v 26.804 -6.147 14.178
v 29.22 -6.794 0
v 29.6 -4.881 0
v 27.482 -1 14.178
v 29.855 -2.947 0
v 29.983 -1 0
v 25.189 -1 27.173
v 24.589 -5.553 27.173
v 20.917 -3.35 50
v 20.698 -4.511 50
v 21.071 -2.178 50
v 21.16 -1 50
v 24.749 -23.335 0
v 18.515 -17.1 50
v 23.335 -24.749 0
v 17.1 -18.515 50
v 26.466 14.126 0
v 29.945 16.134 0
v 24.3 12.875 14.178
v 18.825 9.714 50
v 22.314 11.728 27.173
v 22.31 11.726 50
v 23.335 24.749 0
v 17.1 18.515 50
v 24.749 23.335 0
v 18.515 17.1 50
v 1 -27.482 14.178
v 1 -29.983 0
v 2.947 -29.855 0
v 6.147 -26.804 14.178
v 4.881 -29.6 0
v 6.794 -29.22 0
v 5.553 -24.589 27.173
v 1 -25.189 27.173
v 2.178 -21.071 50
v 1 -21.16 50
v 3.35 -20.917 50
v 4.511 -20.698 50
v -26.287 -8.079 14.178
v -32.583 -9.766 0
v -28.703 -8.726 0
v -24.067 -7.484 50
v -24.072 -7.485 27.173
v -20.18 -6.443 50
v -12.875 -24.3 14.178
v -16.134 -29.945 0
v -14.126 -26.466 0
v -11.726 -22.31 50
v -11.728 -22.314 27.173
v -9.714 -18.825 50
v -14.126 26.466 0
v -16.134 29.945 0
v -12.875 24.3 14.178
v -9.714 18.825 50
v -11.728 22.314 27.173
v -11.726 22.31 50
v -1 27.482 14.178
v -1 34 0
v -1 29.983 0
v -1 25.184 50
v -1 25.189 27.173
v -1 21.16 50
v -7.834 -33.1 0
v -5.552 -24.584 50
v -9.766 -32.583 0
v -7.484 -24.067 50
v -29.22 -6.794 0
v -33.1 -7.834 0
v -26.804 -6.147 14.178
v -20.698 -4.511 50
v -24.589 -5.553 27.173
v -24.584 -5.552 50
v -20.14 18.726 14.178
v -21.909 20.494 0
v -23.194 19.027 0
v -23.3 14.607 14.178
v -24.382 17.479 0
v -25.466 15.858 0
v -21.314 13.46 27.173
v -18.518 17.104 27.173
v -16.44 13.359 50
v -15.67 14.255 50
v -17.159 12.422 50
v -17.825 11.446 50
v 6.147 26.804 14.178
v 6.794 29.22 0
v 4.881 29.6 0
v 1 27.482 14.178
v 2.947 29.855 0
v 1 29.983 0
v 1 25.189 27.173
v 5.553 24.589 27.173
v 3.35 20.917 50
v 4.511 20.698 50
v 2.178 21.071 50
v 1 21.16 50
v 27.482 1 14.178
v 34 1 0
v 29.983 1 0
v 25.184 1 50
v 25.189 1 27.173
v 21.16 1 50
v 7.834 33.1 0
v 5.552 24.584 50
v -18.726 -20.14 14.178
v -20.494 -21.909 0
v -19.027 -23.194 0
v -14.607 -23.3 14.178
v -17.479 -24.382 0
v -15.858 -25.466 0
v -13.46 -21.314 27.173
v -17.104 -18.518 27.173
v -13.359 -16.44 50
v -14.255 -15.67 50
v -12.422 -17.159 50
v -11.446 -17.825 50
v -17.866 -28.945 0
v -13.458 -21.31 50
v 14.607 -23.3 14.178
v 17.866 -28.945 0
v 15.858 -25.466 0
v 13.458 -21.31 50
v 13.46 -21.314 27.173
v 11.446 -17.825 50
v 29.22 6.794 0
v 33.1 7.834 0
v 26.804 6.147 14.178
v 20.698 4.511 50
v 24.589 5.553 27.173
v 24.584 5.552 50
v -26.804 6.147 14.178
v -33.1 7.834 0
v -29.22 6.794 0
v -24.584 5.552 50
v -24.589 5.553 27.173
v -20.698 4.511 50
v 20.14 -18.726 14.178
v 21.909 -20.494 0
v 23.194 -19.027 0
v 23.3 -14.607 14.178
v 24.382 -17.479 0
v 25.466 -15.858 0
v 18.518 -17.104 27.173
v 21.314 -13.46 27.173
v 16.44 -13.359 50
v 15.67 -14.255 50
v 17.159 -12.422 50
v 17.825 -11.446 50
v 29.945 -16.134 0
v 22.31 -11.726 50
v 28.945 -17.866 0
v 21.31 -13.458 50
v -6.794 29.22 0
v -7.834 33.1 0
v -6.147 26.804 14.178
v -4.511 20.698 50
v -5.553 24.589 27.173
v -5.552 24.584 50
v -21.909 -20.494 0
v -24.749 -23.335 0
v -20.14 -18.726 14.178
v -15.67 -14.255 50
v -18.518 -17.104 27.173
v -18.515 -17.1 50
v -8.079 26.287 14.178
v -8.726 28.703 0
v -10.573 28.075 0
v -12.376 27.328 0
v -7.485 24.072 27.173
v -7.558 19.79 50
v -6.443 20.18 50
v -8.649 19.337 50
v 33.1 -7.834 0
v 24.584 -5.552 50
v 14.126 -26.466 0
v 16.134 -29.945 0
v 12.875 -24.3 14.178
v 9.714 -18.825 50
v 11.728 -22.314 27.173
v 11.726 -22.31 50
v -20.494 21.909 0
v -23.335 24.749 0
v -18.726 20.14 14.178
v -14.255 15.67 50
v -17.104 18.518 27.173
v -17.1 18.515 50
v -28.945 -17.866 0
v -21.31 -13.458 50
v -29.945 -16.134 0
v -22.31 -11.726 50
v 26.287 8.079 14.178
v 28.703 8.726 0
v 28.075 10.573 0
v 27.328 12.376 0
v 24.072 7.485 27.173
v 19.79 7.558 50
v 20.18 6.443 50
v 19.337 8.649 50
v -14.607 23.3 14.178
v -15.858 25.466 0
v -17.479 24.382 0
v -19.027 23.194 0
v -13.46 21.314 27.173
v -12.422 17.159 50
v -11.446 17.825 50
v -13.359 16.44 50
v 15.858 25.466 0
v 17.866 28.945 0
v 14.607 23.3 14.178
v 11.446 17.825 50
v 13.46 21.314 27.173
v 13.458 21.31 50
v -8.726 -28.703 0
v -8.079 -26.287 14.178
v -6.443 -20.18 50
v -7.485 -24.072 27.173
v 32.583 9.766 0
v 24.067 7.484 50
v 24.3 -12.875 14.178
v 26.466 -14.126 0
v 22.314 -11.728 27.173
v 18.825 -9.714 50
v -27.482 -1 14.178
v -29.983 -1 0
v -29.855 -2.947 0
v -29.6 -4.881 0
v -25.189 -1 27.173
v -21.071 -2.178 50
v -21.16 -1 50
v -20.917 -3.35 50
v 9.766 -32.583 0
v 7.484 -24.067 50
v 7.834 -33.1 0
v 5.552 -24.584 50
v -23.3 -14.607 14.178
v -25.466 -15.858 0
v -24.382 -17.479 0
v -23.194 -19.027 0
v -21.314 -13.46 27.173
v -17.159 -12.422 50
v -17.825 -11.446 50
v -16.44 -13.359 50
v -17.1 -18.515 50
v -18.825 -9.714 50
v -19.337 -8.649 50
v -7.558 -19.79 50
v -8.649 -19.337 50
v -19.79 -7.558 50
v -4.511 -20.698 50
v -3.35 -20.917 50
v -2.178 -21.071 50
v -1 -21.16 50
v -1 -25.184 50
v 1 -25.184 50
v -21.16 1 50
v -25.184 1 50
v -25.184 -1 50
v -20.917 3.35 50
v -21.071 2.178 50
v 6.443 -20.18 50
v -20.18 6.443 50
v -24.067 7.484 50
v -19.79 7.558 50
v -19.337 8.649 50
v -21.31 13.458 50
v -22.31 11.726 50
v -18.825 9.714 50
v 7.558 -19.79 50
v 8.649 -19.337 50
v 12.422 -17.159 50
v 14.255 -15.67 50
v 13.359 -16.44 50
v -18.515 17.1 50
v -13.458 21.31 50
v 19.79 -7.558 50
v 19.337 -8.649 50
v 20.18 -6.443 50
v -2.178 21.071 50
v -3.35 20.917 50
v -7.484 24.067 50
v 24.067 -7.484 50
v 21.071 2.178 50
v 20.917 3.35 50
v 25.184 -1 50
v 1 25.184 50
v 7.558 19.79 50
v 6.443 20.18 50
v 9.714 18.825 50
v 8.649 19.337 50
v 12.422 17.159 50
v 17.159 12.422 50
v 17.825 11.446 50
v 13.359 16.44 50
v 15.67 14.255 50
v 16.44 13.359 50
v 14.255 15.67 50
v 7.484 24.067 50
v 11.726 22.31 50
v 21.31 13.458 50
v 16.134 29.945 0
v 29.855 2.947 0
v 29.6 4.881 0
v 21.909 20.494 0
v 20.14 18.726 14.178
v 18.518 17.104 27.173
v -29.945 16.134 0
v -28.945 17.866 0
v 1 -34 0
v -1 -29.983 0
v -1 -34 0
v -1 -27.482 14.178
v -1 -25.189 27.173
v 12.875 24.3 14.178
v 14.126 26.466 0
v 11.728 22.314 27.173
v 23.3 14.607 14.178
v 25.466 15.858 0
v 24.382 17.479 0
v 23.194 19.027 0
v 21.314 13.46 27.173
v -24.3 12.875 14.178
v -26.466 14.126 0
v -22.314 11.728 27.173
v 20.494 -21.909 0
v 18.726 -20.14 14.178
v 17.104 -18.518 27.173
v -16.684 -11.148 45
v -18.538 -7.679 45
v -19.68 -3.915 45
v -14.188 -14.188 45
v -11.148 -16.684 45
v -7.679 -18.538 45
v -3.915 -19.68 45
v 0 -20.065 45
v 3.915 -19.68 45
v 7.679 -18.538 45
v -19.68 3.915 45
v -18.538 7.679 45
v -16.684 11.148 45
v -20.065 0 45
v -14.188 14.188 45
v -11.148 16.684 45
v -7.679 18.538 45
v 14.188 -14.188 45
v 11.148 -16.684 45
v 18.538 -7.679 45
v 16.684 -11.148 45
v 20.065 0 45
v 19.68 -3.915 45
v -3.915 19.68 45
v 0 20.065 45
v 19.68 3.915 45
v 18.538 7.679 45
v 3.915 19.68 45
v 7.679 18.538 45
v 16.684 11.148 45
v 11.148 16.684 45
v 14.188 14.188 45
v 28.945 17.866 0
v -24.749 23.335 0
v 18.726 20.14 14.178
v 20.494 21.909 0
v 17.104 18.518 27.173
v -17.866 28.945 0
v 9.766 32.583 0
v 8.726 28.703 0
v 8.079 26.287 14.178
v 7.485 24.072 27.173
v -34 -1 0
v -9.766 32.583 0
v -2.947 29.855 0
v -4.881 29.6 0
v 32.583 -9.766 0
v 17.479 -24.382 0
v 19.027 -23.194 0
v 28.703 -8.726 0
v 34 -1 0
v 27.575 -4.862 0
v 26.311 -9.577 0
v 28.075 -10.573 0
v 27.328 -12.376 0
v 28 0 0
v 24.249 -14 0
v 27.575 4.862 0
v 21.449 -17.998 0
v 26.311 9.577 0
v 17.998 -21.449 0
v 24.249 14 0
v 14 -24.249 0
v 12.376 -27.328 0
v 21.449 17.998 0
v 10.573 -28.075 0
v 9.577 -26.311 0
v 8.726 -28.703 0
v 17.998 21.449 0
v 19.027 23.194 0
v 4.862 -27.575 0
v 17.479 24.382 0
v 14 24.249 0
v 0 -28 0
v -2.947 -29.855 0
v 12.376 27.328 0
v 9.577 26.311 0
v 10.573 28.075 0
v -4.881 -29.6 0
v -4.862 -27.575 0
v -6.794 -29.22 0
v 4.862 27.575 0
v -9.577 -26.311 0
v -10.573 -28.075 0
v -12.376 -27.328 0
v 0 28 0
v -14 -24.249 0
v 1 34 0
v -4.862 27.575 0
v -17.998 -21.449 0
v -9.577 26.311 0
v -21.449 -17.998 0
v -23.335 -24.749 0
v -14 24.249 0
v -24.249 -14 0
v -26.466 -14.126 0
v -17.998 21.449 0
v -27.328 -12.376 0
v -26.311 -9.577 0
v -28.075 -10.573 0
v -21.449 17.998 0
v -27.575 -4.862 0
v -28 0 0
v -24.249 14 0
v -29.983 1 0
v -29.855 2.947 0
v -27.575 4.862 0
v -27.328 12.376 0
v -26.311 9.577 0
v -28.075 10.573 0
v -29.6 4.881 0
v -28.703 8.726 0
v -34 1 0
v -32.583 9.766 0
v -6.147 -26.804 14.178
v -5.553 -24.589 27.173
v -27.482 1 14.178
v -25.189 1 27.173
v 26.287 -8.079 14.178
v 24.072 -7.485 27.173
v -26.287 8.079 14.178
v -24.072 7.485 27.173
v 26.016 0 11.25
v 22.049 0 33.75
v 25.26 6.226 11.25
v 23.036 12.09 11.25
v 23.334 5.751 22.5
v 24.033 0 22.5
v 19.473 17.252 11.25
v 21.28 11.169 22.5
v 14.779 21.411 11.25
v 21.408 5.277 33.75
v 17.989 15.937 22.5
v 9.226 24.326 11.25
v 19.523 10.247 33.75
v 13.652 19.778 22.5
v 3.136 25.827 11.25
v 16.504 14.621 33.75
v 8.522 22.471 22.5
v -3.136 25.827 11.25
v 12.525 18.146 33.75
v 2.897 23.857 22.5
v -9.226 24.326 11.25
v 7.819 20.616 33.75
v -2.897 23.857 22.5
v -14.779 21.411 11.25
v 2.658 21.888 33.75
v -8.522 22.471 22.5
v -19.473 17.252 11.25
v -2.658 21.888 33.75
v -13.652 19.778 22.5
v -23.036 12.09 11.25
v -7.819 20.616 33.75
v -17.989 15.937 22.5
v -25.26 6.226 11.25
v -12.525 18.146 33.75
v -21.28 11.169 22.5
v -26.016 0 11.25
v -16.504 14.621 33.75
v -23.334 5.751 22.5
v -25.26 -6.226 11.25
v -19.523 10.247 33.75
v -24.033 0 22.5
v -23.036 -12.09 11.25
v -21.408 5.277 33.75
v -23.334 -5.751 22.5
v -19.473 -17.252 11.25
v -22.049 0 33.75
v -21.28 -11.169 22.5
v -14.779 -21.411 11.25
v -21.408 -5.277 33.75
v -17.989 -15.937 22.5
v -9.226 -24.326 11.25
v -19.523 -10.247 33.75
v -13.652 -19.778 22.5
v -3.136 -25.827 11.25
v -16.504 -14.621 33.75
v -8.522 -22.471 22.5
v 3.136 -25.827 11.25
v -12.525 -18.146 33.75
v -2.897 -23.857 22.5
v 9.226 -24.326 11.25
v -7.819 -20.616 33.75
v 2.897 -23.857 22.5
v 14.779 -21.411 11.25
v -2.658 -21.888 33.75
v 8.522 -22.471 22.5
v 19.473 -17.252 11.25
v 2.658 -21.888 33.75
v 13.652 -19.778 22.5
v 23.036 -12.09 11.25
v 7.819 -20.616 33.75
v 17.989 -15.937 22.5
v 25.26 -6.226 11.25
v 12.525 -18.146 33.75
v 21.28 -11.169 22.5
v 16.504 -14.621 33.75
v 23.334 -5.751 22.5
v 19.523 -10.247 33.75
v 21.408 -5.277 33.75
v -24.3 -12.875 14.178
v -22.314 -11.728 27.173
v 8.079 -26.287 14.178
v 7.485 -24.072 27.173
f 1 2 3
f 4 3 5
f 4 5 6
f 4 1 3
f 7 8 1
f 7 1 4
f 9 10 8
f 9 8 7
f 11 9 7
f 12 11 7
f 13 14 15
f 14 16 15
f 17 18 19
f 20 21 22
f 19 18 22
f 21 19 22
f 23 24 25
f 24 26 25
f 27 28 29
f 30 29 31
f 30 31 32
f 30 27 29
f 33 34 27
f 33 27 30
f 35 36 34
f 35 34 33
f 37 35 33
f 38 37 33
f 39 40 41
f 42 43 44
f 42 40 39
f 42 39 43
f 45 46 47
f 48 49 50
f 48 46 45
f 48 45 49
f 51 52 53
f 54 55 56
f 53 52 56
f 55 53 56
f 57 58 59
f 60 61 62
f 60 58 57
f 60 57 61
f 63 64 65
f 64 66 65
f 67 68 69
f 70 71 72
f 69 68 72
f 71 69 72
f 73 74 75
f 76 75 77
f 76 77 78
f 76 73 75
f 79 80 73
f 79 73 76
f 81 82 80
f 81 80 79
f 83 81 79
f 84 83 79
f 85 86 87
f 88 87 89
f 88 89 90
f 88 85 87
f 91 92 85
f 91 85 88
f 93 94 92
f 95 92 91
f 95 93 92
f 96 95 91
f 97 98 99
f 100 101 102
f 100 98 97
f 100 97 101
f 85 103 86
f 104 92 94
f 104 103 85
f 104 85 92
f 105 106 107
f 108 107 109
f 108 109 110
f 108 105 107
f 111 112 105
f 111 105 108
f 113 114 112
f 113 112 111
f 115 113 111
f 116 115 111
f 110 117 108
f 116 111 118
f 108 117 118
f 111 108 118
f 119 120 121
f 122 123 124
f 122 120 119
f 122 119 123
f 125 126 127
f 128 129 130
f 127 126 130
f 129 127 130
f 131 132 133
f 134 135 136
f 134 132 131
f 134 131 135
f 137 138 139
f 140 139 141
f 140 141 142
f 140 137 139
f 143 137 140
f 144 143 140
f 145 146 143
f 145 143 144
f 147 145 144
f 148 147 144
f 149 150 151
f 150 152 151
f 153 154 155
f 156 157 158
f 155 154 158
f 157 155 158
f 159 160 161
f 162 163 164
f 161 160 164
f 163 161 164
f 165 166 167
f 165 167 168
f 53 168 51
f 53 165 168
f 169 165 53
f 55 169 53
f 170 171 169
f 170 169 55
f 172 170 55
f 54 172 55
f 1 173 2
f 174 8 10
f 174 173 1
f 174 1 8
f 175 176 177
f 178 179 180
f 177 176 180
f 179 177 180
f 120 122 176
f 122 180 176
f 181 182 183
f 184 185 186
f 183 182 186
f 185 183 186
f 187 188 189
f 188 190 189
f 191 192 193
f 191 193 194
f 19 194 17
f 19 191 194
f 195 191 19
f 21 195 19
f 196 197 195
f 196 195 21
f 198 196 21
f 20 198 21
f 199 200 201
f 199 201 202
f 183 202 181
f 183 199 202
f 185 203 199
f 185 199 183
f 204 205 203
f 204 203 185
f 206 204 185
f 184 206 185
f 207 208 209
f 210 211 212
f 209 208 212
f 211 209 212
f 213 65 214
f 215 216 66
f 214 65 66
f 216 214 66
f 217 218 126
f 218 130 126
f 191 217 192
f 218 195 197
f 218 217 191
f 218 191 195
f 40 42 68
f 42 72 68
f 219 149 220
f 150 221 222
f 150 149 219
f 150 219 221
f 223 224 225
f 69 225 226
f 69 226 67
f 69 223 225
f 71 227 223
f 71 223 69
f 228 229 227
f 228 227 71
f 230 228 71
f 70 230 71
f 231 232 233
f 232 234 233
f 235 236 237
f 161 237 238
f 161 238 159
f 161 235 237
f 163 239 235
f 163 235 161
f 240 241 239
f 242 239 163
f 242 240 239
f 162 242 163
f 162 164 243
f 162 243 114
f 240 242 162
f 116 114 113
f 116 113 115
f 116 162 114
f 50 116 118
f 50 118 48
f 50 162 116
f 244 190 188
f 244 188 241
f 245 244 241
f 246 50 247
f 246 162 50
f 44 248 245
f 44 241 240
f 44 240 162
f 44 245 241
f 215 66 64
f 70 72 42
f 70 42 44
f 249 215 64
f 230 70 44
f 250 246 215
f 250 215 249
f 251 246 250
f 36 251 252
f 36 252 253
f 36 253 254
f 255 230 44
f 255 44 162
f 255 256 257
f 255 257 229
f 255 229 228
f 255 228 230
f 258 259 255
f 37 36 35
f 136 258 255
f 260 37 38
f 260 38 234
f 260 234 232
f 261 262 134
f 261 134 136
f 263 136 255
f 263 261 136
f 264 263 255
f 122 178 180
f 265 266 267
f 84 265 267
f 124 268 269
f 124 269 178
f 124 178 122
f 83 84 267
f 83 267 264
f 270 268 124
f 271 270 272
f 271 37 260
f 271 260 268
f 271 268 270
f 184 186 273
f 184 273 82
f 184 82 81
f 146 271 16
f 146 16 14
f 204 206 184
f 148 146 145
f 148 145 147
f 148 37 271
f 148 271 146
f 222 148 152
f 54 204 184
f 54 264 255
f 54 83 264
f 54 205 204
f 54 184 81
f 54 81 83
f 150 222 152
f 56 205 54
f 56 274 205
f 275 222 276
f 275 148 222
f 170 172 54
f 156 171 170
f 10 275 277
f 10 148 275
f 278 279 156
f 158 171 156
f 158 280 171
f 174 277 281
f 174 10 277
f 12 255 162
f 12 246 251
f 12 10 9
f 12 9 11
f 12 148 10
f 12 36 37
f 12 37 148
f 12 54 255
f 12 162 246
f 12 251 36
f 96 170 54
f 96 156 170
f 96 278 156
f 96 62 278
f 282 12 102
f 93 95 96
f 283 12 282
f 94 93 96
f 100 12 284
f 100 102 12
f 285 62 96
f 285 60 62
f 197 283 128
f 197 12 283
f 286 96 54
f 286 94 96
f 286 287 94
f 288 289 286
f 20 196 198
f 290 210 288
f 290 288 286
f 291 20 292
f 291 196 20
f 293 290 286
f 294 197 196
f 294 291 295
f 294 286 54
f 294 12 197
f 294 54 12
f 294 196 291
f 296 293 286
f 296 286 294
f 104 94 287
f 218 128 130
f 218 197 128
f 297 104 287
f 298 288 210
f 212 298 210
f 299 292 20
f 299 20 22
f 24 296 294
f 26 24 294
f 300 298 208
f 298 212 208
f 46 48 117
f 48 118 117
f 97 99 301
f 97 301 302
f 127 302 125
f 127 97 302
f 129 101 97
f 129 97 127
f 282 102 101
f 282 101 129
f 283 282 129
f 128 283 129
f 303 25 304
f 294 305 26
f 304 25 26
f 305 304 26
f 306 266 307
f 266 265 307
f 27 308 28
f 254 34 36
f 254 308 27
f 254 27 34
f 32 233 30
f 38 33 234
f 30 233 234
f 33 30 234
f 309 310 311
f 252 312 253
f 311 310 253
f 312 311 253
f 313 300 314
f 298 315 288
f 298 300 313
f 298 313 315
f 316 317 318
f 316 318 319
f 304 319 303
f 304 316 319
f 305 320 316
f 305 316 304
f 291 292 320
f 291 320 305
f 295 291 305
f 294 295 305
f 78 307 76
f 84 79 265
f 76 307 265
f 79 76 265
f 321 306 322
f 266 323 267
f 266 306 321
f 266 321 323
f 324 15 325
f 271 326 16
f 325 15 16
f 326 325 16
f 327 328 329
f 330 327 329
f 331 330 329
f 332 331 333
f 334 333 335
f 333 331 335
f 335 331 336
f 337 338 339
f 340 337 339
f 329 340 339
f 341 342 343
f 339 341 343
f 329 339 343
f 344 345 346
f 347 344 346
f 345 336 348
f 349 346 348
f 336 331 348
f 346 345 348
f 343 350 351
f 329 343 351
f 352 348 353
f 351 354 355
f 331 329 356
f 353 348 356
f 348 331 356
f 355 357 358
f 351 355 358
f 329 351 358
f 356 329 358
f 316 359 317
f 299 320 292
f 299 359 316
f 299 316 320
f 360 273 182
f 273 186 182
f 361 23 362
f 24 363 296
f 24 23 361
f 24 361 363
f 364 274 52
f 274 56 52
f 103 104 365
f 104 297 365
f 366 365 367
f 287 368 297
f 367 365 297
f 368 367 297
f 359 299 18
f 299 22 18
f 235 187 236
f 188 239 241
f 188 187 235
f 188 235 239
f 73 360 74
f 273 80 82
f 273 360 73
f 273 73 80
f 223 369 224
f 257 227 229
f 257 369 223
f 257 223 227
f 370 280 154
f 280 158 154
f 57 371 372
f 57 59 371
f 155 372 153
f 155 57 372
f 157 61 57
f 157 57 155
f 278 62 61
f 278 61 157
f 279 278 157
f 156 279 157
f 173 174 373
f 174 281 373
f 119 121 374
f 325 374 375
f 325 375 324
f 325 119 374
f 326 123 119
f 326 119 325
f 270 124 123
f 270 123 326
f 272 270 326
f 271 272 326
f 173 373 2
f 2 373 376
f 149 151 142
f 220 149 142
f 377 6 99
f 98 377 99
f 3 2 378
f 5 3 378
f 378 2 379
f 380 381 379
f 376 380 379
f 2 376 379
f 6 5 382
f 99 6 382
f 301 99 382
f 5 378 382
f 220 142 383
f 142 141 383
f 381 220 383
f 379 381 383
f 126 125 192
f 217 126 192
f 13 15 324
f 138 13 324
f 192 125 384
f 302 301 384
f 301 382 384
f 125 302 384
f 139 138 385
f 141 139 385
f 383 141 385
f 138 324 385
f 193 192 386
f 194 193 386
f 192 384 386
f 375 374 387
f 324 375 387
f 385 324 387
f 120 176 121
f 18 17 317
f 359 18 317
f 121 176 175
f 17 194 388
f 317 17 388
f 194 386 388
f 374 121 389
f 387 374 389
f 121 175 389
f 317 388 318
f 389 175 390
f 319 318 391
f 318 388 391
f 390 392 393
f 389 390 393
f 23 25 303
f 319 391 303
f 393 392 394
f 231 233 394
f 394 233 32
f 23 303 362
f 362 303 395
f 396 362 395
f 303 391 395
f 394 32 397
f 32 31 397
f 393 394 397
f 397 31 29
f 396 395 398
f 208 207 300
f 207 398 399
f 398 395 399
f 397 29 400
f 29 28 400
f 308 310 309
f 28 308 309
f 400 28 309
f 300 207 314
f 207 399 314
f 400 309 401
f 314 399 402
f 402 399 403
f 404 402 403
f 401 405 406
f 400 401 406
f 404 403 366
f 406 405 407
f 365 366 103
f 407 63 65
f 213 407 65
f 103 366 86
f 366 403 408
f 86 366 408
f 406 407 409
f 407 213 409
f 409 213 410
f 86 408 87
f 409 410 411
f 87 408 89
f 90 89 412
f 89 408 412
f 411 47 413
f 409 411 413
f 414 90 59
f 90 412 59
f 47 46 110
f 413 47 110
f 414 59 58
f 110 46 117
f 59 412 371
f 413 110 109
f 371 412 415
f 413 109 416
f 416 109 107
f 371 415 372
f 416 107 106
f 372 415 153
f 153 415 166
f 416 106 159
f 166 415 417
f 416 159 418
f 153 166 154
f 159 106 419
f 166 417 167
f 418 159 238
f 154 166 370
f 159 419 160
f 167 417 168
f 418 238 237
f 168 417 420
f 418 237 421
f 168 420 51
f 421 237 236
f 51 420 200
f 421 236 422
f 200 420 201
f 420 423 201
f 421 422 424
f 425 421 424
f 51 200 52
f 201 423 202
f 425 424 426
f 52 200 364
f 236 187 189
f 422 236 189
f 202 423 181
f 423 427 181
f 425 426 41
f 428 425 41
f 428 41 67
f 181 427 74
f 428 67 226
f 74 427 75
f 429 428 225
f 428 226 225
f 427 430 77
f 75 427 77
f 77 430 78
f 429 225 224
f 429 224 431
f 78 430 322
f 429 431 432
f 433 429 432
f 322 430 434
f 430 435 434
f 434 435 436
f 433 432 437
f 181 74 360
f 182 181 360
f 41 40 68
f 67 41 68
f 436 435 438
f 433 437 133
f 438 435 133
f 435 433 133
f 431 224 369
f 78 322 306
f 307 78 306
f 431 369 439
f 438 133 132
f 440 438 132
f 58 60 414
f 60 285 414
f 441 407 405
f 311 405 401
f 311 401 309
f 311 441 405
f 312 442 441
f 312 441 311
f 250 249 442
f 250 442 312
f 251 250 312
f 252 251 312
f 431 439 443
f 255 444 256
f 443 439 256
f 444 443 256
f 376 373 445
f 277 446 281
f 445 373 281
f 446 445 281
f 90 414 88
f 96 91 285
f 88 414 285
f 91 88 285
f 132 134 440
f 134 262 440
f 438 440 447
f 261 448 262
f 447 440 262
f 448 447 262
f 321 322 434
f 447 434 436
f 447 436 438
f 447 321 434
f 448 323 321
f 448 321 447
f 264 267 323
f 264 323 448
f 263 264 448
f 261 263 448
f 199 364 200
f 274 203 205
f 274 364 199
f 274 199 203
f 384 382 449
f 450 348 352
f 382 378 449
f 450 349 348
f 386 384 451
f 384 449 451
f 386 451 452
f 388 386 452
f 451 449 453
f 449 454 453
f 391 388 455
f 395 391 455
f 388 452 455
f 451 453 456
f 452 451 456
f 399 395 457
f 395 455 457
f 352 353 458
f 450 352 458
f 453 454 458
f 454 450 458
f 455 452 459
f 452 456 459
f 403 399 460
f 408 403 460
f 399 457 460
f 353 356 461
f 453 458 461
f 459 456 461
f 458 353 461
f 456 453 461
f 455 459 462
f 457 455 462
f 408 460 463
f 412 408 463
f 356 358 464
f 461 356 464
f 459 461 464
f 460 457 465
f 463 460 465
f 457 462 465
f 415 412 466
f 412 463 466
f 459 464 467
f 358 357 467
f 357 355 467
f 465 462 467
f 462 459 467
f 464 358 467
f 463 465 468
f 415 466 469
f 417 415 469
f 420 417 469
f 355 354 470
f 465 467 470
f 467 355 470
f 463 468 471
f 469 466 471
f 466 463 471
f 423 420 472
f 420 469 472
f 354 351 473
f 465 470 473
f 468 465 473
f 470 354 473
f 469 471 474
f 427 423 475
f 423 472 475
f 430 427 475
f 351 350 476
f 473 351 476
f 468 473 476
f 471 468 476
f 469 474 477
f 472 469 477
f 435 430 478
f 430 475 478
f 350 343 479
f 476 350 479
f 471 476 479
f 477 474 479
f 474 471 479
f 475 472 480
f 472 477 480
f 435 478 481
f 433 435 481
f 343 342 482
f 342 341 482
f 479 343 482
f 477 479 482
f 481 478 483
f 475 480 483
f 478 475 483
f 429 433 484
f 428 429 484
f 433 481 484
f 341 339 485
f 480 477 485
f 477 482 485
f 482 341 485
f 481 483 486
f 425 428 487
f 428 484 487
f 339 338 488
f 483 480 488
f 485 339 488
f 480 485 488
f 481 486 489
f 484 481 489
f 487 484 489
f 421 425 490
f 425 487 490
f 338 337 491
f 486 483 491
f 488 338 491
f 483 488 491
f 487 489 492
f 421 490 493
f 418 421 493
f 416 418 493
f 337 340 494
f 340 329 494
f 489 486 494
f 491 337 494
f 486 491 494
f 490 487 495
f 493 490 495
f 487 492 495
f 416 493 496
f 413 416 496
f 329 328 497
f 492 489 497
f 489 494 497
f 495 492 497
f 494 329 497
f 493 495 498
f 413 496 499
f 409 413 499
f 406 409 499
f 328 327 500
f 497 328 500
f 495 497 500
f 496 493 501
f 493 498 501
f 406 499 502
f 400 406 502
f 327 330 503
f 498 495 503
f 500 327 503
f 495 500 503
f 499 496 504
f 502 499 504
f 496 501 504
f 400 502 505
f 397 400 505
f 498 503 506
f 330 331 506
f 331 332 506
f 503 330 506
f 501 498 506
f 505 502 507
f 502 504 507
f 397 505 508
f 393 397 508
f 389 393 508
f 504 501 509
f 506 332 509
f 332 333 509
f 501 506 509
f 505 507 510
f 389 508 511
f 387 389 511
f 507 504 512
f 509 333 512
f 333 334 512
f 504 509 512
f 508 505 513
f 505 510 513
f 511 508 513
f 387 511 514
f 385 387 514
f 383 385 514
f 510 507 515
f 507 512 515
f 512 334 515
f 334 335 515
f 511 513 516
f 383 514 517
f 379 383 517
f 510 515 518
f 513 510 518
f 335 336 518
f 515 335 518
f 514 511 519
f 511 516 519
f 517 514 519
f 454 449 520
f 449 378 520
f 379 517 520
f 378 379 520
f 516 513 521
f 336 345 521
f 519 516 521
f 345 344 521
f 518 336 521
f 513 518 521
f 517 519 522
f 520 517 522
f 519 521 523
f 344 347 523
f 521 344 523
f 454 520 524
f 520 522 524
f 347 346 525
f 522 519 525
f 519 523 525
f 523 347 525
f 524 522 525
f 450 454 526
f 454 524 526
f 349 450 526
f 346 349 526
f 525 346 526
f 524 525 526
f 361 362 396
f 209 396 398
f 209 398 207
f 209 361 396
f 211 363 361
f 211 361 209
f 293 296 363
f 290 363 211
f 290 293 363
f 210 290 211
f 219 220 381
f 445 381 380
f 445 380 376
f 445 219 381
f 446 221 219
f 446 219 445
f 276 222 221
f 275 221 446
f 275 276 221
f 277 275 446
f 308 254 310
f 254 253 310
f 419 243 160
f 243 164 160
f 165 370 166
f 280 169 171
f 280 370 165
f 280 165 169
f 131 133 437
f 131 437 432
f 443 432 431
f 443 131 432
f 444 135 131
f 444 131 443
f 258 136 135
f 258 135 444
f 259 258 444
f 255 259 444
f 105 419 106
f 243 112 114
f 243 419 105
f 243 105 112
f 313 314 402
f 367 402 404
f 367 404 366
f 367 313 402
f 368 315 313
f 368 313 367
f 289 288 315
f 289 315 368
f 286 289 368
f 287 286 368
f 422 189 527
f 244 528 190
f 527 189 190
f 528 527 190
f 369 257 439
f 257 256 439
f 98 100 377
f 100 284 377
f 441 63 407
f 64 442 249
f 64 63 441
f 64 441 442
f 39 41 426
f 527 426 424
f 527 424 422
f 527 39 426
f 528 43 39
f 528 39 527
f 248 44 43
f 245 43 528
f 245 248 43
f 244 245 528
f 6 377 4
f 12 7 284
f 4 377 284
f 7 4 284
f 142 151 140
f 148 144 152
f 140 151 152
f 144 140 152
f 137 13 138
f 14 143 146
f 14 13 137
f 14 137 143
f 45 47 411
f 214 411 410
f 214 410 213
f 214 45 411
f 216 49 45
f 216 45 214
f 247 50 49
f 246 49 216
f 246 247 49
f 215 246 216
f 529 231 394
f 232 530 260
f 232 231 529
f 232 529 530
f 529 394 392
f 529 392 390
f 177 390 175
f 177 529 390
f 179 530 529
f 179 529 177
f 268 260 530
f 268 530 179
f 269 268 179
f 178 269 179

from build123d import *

# Parameters (mm, degrees)
SKETCH1_R           = 30
BOSS_EXTRUDE6_DEPTH = 50
BOSS_EXTRUDE6_TAPER = 10
SKETCH5_R           = 28
CUT_EXTRUDE1_DEPTH  = 50
CUT_EXTRUDE1_TAPER  = 10
SKETCH6_R           = 21.183650965
BOSS_EXTRUDE7_DEPTH = 5
BOSS_EXTRUDE8_DEPTH = 1
CIRPATTERN2_COUNT   = 24


with BuildPart() as part:
    # Sketch1 → Boss-Extrude6 (new body)
    with BuildSketch(Plane.XY):
        Circle(SKETCH1_R)
    extrude(amount=BOSS_EXTRUDE6_DEPTH, taper=BOSS_EXTRUDE6_TAPER)

    # Sketch5 → Cut-Extrude1 (cut)
    with BuildSketch(Plane.XY):
        Circle(SKETCH5_R)
    extrude(amount=CUT_EXTRUDE1_DEPTH, taper=CUT_EXTRUDE1_TAPER, mode=Mode.SUBTRACT)

    # Sketch6 → Boss-Extrude7 (add)
    with BuildSketch(Plane.XY.offset(50)):
        Circle(SKETCH6_R)
    extrude(amount=-BOSS_EXTRUDE7_DEPTH)

    # Sketch7 → Boss-Extrude8 (add, symmetric)
    with BuildSketch(Plane(origin=(0, 0, 0), x_dir=(0, 0, -1), z_dir=(1, 0, 0))):
        Polygon((0, 28), (-50, 19.183650965), (-50, 25.183650965), (0, 34), align=None)
    boss_extrude8 = extrude(amount=BOSS_EXTRUDE8_DEPTH, both=True)

    # CirPattern2: Boss-Extrude8 ×24 about axis
    cirpattern2_axis = Axis((0, 0, 0), (0, 0, 1))
    for i in range(1, CIRPATTERN2_COUNT):
        add(boss_extrude8.rotate(cirpattern2_axis, i * 360 / CIRPATTERN2_COUNT))


solid = part.part
